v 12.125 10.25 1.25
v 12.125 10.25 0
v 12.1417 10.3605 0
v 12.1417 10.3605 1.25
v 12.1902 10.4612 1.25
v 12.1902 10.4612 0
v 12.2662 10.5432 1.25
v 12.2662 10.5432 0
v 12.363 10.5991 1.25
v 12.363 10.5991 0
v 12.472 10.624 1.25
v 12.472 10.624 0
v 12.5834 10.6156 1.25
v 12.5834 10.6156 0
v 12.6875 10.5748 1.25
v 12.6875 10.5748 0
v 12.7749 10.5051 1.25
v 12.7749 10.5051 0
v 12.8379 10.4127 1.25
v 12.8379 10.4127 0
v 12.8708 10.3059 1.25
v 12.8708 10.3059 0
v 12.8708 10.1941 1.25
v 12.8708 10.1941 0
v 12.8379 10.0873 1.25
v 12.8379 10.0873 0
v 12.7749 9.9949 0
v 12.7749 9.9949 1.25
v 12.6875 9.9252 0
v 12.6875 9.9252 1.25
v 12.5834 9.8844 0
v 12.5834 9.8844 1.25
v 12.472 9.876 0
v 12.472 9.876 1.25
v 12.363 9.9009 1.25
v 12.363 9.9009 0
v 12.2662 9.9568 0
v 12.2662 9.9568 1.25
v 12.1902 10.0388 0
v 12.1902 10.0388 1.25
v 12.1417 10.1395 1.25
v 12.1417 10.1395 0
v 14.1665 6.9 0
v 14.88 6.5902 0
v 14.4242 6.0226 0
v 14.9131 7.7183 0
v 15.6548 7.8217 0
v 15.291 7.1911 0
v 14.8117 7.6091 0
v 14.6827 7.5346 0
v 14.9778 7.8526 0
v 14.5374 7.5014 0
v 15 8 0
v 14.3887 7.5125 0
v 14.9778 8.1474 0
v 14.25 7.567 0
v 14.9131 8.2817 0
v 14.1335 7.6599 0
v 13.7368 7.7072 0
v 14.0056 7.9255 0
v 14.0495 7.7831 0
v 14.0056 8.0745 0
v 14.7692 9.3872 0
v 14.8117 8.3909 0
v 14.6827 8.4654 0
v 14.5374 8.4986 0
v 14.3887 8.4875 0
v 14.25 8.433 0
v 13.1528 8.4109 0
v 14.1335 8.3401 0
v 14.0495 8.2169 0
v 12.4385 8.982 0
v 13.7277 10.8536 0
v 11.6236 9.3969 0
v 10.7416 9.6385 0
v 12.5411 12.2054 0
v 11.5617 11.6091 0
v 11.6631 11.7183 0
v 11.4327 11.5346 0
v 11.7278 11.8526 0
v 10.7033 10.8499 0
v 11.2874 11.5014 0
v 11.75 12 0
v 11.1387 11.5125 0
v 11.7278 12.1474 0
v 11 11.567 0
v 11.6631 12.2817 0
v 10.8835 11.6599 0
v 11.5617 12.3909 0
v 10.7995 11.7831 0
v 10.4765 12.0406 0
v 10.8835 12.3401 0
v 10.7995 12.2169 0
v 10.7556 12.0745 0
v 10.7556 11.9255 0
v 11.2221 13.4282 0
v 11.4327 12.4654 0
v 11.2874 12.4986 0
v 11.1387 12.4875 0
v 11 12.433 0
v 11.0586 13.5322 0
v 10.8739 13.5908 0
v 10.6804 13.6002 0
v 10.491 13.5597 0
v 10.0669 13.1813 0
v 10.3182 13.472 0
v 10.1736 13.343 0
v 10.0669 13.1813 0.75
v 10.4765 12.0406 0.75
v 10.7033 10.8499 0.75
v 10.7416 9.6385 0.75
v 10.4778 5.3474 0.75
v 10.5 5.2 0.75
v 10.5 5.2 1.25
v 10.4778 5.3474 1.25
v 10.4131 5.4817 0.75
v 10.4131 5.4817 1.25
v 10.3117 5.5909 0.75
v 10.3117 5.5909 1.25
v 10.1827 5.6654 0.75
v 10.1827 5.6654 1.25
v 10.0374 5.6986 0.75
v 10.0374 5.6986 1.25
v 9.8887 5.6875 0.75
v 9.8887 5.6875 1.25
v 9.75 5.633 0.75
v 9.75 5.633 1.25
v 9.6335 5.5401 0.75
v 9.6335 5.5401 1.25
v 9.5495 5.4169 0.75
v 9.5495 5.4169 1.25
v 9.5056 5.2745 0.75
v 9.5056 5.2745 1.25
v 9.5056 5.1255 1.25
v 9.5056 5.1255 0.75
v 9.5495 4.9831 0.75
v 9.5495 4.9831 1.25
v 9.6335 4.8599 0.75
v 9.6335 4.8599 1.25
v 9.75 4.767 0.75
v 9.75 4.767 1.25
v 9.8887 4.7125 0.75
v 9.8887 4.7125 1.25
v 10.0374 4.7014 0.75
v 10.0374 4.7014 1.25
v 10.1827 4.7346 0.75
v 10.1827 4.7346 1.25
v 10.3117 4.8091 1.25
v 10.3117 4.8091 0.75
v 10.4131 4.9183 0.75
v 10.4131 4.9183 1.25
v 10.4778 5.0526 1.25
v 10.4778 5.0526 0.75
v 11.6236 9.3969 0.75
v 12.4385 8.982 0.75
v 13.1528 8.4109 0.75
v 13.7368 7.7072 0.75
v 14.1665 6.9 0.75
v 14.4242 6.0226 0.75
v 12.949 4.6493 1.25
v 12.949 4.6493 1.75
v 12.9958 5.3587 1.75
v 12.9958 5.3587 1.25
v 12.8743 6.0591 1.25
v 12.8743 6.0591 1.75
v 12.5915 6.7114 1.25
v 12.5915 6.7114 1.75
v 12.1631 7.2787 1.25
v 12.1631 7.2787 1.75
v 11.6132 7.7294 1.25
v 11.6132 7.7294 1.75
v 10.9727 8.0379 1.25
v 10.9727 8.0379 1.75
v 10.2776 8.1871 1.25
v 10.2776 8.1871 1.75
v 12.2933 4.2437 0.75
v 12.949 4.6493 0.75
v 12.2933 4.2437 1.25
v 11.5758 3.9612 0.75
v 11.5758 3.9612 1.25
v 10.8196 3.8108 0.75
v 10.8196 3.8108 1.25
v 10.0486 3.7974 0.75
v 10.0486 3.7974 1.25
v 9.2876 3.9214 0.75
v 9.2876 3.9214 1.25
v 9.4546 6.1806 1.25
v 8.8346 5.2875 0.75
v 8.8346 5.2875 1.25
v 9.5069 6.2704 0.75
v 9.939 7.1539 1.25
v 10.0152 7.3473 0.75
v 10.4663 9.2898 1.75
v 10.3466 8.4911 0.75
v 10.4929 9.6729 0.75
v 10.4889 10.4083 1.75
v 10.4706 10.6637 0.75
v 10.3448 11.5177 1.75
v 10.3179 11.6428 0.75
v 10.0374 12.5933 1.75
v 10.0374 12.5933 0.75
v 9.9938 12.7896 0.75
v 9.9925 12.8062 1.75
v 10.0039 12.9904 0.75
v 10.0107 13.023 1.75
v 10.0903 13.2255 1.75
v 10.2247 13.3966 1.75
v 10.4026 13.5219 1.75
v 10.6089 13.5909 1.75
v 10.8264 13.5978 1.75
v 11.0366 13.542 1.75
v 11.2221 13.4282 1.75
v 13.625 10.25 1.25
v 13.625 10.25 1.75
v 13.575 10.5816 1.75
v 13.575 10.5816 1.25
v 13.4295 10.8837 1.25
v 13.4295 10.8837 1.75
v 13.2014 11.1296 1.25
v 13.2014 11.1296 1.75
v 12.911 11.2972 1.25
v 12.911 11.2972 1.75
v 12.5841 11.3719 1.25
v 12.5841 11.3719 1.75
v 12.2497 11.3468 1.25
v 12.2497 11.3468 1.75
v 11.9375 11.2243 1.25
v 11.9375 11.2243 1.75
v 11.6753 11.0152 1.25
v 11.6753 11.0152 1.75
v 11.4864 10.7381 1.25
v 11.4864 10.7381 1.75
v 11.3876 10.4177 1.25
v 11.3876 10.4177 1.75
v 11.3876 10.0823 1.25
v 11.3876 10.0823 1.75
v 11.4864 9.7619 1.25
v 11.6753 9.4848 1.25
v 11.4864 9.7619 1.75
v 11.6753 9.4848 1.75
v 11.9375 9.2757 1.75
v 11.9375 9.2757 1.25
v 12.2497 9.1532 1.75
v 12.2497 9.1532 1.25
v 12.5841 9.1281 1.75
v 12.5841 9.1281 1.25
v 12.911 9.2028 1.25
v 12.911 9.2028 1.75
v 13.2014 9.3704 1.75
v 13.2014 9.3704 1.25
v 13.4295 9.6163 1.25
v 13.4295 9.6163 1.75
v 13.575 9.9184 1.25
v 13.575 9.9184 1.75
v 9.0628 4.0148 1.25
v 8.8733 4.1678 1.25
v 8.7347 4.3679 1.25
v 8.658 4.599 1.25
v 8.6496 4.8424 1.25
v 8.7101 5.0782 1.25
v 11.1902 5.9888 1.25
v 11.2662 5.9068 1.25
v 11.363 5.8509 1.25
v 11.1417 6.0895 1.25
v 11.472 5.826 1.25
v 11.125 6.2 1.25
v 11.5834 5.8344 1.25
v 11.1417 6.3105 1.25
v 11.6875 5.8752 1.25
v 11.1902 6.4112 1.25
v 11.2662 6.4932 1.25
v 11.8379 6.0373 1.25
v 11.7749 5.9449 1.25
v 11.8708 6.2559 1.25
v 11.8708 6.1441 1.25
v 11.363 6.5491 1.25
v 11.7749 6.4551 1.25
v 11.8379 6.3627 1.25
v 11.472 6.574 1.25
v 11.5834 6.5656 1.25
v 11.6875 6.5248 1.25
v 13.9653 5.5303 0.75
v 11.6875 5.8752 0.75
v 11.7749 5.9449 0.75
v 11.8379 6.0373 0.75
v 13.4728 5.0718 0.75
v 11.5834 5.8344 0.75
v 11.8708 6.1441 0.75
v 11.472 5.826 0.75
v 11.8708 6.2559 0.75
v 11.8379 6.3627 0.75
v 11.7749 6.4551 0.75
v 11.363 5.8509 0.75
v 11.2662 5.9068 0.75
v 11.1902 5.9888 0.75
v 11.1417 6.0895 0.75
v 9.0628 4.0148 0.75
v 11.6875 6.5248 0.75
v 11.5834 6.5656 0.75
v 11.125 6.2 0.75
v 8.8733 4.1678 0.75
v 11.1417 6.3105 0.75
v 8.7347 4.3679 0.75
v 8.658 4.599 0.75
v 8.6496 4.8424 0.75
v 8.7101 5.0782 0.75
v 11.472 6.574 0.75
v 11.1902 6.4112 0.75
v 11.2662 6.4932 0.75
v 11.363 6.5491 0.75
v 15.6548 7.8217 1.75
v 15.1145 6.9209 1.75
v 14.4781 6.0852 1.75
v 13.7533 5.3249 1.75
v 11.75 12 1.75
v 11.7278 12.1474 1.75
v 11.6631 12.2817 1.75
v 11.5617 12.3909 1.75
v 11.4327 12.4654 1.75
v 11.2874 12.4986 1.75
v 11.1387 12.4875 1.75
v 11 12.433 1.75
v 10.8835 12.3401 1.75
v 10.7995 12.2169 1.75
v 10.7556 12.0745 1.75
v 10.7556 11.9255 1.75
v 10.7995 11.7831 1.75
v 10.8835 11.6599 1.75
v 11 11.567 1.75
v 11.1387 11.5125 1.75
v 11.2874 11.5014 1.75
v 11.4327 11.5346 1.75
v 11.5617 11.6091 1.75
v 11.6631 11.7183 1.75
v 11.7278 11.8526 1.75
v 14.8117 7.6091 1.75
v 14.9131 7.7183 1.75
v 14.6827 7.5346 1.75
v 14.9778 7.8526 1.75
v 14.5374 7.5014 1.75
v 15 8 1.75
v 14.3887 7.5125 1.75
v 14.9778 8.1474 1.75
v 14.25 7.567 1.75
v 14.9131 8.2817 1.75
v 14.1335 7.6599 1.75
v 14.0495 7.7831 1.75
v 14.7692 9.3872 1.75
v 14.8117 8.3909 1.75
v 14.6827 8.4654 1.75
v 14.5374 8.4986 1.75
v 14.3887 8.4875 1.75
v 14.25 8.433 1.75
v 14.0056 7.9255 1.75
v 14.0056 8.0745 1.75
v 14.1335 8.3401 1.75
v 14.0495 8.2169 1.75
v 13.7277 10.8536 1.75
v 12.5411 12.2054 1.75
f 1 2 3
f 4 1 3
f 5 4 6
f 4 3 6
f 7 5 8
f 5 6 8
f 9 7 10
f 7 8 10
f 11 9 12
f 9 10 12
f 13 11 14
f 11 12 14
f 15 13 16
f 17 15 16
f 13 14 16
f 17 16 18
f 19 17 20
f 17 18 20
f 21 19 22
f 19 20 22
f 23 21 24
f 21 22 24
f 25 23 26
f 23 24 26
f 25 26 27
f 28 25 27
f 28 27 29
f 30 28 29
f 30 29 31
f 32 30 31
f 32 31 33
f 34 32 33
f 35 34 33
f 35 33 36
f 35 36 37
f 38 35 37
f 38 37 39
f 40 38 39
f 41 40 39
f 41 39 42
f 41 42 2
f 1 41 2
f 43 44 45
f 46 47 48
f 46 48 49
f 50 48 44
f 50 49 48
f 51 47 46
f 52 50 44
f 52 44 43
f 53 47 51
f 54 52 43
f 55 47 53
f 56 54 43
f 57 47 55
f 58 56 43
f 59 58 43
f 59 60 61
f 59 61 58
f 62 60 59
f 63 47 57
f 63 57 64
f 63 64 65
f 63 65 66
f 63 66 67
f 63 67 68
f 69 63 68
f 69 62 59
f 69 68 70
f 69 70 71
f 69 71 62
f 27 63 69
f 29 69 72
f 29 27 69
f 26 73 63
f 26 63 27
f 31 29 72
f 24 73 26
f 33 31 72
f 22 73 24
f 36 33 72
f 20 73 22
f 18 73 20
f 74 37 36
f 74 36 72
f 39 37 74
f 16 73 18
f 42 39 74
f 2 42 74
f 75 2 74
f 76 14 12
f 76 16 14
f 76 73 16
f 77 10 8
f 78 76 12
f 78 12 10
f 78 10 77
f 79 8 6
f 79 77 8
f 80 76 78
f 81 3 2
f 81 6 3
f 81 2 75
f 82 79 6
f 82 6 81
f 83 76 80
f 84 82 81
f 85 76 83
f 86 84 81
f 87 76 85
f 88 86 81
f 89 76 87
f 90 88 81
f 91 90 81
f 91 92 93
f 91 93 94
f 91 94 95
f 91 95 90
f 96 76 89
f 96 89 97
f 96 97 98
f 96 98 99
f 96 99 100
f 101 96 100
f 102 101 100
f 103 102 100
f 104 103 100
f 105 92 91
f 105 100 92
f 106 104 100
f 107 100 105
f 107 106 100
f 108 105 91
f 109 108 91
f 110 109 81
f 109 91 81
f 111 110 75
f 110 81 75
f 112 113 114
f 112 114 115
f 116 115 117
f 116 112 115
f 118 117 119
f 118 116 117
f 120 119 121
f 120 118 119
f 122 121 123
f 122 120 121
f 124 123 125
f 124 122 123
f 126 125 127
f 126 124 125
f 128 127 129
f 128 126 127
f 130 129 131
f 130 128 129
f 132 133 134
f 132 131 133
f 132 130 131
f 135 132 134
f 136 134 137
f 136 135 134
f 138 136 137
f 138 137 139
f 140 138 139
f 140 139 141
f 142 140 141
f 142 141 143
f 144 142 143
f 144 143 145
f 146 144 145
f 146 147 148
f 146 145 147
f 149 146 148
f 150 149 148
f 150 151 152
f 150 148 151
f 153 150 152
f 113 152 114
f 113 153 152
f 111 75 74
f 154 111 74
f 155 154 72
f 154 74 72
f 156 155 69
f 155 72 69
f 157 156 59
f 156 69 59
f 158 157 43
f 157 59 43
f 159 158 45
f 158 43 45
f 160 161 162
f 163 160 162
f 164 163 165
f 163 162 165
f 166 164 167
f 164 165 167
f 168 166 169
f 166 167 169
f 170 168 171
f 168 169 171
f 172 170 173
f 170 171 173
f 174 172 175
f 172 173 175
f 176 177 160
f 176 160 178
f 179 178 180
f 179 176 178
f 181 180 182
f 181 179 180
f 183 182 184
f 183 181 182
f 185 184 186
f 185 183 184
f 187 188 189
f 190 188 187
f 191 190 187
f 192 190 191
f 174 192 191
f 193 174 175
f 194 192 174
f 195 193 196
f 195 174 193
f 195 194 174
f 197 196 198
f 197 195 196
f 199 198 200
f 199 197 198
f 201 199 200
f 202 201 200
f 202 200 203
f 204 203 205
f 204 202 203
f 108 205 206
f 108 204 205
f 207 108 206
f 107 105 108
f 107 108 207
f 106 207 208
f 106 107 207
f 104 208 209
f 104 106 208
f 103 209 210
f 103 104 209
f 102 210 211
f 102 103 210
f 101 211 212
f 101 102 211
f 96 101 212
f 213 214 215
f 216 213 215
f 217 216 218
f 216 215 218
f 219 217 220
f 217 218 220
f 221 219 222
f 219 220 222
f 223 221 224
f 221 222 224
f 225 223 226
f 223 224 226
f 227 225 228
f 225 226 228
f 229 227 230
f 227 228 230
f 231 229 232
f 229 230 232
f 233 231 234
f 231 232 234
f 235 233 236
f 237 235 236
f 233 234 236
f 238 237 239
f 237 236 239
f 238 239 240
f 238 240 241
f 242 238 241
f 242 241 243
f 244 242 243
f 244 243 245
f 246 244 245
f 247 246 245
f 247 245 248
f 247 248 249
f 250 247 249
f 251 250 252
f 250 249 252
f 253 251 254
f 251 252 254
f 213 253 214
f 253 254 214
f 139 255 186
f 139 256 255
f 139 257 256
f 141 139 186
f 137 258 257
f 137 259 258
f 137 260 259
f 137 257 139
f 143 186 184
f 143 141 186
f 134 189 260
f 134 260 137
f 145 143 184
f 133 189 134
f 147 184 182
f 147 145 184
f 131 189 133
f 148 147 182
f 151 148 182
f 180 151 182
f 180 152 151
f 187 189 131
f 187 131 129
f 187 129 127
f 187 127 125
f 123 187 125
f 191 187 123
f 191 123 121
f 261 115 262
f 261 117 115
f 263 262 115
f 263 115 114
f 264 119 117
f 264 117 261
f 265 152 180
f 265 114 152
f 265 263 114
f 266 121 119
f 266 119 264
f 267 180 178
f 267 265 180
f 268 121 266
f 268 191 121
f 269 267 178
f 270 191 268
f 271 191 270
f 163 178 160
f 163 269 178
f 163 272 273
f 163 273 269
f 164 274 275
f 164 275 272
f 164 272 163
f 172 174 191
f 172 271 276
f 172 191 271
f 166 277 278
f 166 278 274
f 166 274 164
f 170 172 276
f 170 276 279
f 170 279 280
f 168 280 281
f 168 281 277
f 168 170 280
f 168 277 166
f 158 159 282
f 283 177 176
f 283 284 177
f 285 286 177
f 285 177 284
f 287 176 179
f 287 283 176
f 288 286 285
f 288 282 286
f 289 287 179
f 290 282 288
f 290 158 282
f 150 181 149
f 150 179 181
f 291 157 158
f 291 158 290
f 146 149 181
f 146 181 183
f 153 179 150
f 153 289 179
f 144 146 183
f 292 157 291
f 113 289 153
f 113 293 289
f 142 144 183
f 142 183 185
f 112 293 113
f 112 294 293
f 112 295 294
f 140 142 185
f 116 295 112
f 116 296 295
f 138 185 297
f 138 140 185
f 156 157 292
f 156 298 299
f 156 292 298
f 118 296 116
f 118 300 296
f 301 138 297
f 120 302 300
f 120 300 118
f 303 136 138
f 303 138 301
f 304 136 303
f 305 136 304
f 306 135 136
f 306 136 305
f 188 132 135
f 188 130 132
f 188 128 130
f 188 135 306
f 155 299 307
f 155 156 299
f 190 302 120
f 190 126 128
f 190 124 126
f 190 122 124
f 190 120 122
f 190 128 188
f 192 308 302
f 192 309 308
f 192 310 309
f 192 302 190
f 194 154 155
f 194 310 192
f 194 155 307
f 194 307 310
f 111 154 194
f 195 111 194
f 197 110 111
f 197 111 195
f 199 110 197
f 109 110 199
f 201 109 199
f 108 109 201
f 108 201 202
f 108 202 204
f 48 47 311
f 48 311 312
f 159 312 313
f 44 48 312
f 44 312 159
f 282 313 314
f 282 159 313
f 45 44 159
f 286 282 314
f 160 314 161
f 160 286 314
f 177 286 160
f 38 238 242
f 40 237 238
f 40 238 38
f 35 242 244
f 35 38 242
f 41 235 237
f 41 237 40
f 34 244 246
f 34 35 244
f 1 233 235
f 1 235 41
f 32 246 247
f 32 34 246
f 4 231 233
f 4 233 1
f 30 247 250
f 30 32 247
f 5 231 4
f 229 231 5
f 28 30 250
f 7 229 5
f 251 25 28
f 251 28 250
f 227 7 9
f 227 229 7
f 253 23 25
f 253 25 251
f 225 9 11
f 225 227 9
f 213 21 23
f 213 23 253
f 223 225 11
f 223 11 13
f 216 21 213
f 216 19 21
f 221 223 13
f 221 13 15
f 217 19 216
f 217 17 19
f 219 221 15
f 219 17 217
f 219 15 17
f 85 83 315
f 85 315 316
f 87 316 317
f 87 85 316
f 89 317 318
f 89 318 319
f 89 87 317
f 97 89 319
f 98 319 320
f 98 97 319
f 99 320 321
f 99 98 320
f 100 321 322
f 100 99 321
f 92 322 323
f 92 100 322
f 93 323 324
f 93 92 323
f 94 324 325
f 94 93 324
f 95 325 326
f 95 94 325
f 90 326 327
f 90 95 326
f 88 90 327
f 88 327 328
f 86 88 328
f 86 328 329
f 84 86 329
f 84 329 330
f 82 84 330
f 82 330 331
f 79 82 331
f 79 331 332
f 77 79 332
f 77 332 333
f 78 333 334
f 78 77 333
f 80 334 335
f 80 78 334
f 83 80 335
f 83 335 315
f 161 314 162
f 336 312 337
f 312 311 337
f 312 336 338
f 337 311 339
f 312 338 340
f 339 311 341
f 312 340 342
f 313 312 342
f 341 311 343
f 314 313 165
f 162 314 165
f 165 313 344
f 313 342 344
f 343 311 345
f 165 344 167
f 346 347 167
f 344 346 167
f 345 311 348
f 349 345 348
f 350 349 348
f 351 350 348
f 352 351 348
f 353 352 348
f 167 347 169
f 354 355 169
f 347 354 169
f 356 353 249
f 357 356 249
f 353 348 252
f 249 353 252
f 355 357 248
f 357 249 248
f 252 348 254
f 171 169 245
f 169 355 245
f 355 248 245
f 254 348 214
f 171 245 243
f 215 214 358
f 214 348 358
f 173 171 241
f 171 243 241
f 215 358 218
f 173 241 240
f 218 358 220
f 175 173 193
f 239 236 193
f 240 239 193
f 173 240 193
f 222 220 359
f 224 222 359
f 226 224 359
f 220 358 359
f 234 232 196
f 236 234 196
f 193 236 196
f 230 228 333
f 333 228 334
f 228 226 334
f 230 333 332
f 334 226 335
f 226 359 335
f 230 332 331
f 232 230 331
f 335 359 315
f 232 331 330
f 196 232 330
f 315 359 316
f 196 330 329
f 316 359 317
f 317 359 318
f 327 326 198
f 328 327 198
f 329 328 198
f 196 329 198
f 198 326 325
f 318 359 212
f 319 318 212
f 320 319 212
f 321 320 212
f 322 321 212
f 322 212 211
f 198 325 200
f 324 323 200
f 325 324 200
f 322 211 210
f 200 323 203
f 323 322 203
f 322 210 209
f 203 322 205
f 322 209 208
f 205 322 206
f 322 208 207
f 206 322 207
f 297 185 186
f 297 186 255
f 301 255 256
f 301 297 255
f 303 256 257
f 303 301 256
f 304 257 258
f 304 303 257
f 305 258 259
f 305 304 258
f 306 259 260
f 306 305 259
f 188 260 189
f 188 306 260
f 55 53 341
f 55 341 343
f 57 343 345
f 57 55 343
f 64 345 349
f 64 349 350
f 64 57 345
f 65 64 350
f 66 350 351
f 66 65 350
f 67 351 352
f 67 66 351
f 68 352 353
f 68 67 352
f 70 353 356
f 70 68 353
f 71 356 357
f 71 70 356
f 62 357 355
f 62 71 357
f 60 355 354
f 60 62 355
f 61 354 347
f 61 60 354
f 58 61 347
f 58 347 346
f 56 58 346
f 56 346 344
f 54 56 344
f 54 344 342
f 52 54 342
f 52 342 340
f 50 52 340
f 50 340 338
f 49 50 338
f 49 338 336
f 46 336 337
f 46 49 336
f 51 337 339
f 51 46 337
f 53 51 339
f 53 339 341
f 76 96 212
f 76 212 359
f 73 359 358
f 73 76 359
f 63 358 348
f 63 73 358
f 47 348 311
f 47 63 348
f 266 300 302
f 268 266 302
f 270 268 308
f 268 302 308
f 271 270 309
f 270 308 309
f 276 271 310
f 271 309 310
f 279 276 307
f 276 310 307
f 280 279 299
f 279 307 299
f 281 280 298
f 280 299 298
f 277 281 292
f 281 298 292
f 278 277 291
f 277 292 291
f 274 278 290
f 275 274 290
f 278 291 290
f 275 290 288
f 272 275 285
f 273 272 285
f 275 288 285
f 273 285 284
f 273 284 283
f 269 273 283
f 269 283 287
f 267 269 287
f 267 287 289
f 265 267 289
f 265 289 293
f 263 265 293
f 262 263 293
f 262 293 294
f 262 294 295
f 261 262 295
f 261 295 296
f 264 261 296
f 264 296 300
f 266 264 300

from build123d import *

# Parameters (mm, degrees)
CROQUIS1_R                     = 0.5
SALIENTE_EXTRUIR1_DEPTH        = 1.75
CROQUIS3_R                     = 4.5
CORTAR_EXTRUIR2_DEPTH          = 0.75
CORTAR_EXTRUIR3_DEPTH          = 0.75
CROQUIS5_R                     = 1.125
CORTAR_EXTRUIR4_DEPTH          = 0.5
TALADRO_ROSCADO_M1X0_251_D     = 0.75
CROQUIS8_R                     = 3
CORTAR_EXTRUIR5_DEPTH          = 0.5
TALADRO_ROSCADO_M1X0_252_D     = 0.75
TALADRO_ROSCADO_M1X0_252_DEPTH = 2
TALADRO_ROSCADO_M1X0_252_TIP   = 0.225322732


with BuildPart() as part:
    # Croquis1 → Saliente-Extruir1 (new body)
    with BuildSketch(Plane.XY):
        with BuildLine():
            ThreePointArc((8.834558852, 5.287471697), (10.400375853, 8.781625166), (10.037373186, 12.593333499))
            ThreePointArc((10.037373186, 12.593333499), (10.309088925, 13.465738911), (11.222055752, 13.428159394))
            ThreePointArc((11.222055752, 13.428159394), (13.727670201, 10.853620173), (15.654756656, 7.821674632))
            ThreePointArc((15.654756656, 7.821674632), (14.478080126, 6.085191999), (12.949014501, 4.649260976))
            ThreePointArc((12.949014501, 4.649260976), (11.201069025, 3.869086941), (9.287630024, 3.921394702))
            ThreePointArc((9.287630024, 3.921394702), (8.688101188, 4.480726783), (8.834558852, 5.287471697))
        make_face()
        with Locations((10, 5.2)):
            Circle(CROQUIS1_R, mode=Mode.SUBTRACT)
        with Locations((11.25, 12)):
            Circle(CROQUIS1_R, mode=Mode.SUBTRACT)
        with Locations((14.5, 8)):
            Circle(CROQUIS1_R, mode=Mode.SUBTRACT)
    extrude(amount=SALIENTE_EXTRUIR1_DEPTH)

    # Croquis3 → Cortar-Extruir2 (cut)
    with BuildSketch(Plane(origin=(0, 0, 0), x_dir=(-1, 0, 0), z_dir=(0, 0, -1))):
        with Locations((-10, 5.2)):
            Circle(CROQUIS3_R)
    extrude(amount=-CORTAR_EXTRUIR2_DEPTH, mode=Mode.SUBTRACT)

    # Croquis4 → Cortar-Extruir3 (cut)
    with BuildSketch(Plane(origin=(0, 0, 0), x_dir=(-1, 0, 0), z_dir=(0, 0, -1))):
        with BuildLine():
            ThreePointArc((-10.066948965, 13.181309844), (-10.613207176, 11.449681517), (-10.741563253, 9.63847766))
            ThreePointArc((-10.741563253, 9.63847766), (-10.61745437, 9.657437616), (-10.492864863, 9.672927925))
            ThreePointArc((-10.492864863, 9.672927925), (-10.410407993, 11.155791234), (-10.037373186, 12.593333499))
            ThreePointArc((-10.037373186, 12.593333499), (-9.992057529, 12.890344938), (-10.066948965, 13.181309844))
        make_face()
    extrude(amount=-CORTAR_EXTRUIR3_DEPTH, mode=Mode.SUBTRACT)

    # Croquis5 → Cortar-Extruir4 (cut)
    with BuildSketch(Plane.XY.offset(1.75)):
        with Locations((12.5, 10.25)):
            Circle(CROQUIS5_R)
    extrude(amount=-CORTAR_EXTRUIR4_DEPTH, mode=Mode.SUBTRACT)

    # Taladro roscado M1x0.251 (through all)
    with Locations(Plane.XY.offset(1.25)):
        with Locations((12.5, 10.25)):
            Hole(TALADRO_ROSCADO_M1X0_251_D / 2)

    # Croquis8 → Cortar-Extruir5 (cut)
    with BuildSketch(Plane.XY.offset(1.75)):
        with Locations((10, 5.2)):
            Circle(CROQUIS8_R)
    extrude(amount=-CORTAR_EXTRUIR5_DEPTH, mode=Mode.SUBTRACT)

    # Taladro roscado M1x0.252
    with Locations(Plane.XY.offset(1.25)):
        with Locations((11.5, 6.2)):
            Hole(TALADRO_ROSCADO_M1X0_252_D / 2, depth=TALADRO_ROSCADO_M1X0_252_DEPTH)
            with Locations((0, 0, -(TALADRO_ROSCADO_M1X0_252_DEPTH + TALADRO_ROSCADO_M1X0_252_TIP / 2))):  # 118° drill point
                Cone(0, TALADRO_ROSCADO_M1X0_252_D / 2, TALADRO_ROSCADO_M1X0_252_TIP, mode=Mode.SUBTRACT)


solid = part.part
